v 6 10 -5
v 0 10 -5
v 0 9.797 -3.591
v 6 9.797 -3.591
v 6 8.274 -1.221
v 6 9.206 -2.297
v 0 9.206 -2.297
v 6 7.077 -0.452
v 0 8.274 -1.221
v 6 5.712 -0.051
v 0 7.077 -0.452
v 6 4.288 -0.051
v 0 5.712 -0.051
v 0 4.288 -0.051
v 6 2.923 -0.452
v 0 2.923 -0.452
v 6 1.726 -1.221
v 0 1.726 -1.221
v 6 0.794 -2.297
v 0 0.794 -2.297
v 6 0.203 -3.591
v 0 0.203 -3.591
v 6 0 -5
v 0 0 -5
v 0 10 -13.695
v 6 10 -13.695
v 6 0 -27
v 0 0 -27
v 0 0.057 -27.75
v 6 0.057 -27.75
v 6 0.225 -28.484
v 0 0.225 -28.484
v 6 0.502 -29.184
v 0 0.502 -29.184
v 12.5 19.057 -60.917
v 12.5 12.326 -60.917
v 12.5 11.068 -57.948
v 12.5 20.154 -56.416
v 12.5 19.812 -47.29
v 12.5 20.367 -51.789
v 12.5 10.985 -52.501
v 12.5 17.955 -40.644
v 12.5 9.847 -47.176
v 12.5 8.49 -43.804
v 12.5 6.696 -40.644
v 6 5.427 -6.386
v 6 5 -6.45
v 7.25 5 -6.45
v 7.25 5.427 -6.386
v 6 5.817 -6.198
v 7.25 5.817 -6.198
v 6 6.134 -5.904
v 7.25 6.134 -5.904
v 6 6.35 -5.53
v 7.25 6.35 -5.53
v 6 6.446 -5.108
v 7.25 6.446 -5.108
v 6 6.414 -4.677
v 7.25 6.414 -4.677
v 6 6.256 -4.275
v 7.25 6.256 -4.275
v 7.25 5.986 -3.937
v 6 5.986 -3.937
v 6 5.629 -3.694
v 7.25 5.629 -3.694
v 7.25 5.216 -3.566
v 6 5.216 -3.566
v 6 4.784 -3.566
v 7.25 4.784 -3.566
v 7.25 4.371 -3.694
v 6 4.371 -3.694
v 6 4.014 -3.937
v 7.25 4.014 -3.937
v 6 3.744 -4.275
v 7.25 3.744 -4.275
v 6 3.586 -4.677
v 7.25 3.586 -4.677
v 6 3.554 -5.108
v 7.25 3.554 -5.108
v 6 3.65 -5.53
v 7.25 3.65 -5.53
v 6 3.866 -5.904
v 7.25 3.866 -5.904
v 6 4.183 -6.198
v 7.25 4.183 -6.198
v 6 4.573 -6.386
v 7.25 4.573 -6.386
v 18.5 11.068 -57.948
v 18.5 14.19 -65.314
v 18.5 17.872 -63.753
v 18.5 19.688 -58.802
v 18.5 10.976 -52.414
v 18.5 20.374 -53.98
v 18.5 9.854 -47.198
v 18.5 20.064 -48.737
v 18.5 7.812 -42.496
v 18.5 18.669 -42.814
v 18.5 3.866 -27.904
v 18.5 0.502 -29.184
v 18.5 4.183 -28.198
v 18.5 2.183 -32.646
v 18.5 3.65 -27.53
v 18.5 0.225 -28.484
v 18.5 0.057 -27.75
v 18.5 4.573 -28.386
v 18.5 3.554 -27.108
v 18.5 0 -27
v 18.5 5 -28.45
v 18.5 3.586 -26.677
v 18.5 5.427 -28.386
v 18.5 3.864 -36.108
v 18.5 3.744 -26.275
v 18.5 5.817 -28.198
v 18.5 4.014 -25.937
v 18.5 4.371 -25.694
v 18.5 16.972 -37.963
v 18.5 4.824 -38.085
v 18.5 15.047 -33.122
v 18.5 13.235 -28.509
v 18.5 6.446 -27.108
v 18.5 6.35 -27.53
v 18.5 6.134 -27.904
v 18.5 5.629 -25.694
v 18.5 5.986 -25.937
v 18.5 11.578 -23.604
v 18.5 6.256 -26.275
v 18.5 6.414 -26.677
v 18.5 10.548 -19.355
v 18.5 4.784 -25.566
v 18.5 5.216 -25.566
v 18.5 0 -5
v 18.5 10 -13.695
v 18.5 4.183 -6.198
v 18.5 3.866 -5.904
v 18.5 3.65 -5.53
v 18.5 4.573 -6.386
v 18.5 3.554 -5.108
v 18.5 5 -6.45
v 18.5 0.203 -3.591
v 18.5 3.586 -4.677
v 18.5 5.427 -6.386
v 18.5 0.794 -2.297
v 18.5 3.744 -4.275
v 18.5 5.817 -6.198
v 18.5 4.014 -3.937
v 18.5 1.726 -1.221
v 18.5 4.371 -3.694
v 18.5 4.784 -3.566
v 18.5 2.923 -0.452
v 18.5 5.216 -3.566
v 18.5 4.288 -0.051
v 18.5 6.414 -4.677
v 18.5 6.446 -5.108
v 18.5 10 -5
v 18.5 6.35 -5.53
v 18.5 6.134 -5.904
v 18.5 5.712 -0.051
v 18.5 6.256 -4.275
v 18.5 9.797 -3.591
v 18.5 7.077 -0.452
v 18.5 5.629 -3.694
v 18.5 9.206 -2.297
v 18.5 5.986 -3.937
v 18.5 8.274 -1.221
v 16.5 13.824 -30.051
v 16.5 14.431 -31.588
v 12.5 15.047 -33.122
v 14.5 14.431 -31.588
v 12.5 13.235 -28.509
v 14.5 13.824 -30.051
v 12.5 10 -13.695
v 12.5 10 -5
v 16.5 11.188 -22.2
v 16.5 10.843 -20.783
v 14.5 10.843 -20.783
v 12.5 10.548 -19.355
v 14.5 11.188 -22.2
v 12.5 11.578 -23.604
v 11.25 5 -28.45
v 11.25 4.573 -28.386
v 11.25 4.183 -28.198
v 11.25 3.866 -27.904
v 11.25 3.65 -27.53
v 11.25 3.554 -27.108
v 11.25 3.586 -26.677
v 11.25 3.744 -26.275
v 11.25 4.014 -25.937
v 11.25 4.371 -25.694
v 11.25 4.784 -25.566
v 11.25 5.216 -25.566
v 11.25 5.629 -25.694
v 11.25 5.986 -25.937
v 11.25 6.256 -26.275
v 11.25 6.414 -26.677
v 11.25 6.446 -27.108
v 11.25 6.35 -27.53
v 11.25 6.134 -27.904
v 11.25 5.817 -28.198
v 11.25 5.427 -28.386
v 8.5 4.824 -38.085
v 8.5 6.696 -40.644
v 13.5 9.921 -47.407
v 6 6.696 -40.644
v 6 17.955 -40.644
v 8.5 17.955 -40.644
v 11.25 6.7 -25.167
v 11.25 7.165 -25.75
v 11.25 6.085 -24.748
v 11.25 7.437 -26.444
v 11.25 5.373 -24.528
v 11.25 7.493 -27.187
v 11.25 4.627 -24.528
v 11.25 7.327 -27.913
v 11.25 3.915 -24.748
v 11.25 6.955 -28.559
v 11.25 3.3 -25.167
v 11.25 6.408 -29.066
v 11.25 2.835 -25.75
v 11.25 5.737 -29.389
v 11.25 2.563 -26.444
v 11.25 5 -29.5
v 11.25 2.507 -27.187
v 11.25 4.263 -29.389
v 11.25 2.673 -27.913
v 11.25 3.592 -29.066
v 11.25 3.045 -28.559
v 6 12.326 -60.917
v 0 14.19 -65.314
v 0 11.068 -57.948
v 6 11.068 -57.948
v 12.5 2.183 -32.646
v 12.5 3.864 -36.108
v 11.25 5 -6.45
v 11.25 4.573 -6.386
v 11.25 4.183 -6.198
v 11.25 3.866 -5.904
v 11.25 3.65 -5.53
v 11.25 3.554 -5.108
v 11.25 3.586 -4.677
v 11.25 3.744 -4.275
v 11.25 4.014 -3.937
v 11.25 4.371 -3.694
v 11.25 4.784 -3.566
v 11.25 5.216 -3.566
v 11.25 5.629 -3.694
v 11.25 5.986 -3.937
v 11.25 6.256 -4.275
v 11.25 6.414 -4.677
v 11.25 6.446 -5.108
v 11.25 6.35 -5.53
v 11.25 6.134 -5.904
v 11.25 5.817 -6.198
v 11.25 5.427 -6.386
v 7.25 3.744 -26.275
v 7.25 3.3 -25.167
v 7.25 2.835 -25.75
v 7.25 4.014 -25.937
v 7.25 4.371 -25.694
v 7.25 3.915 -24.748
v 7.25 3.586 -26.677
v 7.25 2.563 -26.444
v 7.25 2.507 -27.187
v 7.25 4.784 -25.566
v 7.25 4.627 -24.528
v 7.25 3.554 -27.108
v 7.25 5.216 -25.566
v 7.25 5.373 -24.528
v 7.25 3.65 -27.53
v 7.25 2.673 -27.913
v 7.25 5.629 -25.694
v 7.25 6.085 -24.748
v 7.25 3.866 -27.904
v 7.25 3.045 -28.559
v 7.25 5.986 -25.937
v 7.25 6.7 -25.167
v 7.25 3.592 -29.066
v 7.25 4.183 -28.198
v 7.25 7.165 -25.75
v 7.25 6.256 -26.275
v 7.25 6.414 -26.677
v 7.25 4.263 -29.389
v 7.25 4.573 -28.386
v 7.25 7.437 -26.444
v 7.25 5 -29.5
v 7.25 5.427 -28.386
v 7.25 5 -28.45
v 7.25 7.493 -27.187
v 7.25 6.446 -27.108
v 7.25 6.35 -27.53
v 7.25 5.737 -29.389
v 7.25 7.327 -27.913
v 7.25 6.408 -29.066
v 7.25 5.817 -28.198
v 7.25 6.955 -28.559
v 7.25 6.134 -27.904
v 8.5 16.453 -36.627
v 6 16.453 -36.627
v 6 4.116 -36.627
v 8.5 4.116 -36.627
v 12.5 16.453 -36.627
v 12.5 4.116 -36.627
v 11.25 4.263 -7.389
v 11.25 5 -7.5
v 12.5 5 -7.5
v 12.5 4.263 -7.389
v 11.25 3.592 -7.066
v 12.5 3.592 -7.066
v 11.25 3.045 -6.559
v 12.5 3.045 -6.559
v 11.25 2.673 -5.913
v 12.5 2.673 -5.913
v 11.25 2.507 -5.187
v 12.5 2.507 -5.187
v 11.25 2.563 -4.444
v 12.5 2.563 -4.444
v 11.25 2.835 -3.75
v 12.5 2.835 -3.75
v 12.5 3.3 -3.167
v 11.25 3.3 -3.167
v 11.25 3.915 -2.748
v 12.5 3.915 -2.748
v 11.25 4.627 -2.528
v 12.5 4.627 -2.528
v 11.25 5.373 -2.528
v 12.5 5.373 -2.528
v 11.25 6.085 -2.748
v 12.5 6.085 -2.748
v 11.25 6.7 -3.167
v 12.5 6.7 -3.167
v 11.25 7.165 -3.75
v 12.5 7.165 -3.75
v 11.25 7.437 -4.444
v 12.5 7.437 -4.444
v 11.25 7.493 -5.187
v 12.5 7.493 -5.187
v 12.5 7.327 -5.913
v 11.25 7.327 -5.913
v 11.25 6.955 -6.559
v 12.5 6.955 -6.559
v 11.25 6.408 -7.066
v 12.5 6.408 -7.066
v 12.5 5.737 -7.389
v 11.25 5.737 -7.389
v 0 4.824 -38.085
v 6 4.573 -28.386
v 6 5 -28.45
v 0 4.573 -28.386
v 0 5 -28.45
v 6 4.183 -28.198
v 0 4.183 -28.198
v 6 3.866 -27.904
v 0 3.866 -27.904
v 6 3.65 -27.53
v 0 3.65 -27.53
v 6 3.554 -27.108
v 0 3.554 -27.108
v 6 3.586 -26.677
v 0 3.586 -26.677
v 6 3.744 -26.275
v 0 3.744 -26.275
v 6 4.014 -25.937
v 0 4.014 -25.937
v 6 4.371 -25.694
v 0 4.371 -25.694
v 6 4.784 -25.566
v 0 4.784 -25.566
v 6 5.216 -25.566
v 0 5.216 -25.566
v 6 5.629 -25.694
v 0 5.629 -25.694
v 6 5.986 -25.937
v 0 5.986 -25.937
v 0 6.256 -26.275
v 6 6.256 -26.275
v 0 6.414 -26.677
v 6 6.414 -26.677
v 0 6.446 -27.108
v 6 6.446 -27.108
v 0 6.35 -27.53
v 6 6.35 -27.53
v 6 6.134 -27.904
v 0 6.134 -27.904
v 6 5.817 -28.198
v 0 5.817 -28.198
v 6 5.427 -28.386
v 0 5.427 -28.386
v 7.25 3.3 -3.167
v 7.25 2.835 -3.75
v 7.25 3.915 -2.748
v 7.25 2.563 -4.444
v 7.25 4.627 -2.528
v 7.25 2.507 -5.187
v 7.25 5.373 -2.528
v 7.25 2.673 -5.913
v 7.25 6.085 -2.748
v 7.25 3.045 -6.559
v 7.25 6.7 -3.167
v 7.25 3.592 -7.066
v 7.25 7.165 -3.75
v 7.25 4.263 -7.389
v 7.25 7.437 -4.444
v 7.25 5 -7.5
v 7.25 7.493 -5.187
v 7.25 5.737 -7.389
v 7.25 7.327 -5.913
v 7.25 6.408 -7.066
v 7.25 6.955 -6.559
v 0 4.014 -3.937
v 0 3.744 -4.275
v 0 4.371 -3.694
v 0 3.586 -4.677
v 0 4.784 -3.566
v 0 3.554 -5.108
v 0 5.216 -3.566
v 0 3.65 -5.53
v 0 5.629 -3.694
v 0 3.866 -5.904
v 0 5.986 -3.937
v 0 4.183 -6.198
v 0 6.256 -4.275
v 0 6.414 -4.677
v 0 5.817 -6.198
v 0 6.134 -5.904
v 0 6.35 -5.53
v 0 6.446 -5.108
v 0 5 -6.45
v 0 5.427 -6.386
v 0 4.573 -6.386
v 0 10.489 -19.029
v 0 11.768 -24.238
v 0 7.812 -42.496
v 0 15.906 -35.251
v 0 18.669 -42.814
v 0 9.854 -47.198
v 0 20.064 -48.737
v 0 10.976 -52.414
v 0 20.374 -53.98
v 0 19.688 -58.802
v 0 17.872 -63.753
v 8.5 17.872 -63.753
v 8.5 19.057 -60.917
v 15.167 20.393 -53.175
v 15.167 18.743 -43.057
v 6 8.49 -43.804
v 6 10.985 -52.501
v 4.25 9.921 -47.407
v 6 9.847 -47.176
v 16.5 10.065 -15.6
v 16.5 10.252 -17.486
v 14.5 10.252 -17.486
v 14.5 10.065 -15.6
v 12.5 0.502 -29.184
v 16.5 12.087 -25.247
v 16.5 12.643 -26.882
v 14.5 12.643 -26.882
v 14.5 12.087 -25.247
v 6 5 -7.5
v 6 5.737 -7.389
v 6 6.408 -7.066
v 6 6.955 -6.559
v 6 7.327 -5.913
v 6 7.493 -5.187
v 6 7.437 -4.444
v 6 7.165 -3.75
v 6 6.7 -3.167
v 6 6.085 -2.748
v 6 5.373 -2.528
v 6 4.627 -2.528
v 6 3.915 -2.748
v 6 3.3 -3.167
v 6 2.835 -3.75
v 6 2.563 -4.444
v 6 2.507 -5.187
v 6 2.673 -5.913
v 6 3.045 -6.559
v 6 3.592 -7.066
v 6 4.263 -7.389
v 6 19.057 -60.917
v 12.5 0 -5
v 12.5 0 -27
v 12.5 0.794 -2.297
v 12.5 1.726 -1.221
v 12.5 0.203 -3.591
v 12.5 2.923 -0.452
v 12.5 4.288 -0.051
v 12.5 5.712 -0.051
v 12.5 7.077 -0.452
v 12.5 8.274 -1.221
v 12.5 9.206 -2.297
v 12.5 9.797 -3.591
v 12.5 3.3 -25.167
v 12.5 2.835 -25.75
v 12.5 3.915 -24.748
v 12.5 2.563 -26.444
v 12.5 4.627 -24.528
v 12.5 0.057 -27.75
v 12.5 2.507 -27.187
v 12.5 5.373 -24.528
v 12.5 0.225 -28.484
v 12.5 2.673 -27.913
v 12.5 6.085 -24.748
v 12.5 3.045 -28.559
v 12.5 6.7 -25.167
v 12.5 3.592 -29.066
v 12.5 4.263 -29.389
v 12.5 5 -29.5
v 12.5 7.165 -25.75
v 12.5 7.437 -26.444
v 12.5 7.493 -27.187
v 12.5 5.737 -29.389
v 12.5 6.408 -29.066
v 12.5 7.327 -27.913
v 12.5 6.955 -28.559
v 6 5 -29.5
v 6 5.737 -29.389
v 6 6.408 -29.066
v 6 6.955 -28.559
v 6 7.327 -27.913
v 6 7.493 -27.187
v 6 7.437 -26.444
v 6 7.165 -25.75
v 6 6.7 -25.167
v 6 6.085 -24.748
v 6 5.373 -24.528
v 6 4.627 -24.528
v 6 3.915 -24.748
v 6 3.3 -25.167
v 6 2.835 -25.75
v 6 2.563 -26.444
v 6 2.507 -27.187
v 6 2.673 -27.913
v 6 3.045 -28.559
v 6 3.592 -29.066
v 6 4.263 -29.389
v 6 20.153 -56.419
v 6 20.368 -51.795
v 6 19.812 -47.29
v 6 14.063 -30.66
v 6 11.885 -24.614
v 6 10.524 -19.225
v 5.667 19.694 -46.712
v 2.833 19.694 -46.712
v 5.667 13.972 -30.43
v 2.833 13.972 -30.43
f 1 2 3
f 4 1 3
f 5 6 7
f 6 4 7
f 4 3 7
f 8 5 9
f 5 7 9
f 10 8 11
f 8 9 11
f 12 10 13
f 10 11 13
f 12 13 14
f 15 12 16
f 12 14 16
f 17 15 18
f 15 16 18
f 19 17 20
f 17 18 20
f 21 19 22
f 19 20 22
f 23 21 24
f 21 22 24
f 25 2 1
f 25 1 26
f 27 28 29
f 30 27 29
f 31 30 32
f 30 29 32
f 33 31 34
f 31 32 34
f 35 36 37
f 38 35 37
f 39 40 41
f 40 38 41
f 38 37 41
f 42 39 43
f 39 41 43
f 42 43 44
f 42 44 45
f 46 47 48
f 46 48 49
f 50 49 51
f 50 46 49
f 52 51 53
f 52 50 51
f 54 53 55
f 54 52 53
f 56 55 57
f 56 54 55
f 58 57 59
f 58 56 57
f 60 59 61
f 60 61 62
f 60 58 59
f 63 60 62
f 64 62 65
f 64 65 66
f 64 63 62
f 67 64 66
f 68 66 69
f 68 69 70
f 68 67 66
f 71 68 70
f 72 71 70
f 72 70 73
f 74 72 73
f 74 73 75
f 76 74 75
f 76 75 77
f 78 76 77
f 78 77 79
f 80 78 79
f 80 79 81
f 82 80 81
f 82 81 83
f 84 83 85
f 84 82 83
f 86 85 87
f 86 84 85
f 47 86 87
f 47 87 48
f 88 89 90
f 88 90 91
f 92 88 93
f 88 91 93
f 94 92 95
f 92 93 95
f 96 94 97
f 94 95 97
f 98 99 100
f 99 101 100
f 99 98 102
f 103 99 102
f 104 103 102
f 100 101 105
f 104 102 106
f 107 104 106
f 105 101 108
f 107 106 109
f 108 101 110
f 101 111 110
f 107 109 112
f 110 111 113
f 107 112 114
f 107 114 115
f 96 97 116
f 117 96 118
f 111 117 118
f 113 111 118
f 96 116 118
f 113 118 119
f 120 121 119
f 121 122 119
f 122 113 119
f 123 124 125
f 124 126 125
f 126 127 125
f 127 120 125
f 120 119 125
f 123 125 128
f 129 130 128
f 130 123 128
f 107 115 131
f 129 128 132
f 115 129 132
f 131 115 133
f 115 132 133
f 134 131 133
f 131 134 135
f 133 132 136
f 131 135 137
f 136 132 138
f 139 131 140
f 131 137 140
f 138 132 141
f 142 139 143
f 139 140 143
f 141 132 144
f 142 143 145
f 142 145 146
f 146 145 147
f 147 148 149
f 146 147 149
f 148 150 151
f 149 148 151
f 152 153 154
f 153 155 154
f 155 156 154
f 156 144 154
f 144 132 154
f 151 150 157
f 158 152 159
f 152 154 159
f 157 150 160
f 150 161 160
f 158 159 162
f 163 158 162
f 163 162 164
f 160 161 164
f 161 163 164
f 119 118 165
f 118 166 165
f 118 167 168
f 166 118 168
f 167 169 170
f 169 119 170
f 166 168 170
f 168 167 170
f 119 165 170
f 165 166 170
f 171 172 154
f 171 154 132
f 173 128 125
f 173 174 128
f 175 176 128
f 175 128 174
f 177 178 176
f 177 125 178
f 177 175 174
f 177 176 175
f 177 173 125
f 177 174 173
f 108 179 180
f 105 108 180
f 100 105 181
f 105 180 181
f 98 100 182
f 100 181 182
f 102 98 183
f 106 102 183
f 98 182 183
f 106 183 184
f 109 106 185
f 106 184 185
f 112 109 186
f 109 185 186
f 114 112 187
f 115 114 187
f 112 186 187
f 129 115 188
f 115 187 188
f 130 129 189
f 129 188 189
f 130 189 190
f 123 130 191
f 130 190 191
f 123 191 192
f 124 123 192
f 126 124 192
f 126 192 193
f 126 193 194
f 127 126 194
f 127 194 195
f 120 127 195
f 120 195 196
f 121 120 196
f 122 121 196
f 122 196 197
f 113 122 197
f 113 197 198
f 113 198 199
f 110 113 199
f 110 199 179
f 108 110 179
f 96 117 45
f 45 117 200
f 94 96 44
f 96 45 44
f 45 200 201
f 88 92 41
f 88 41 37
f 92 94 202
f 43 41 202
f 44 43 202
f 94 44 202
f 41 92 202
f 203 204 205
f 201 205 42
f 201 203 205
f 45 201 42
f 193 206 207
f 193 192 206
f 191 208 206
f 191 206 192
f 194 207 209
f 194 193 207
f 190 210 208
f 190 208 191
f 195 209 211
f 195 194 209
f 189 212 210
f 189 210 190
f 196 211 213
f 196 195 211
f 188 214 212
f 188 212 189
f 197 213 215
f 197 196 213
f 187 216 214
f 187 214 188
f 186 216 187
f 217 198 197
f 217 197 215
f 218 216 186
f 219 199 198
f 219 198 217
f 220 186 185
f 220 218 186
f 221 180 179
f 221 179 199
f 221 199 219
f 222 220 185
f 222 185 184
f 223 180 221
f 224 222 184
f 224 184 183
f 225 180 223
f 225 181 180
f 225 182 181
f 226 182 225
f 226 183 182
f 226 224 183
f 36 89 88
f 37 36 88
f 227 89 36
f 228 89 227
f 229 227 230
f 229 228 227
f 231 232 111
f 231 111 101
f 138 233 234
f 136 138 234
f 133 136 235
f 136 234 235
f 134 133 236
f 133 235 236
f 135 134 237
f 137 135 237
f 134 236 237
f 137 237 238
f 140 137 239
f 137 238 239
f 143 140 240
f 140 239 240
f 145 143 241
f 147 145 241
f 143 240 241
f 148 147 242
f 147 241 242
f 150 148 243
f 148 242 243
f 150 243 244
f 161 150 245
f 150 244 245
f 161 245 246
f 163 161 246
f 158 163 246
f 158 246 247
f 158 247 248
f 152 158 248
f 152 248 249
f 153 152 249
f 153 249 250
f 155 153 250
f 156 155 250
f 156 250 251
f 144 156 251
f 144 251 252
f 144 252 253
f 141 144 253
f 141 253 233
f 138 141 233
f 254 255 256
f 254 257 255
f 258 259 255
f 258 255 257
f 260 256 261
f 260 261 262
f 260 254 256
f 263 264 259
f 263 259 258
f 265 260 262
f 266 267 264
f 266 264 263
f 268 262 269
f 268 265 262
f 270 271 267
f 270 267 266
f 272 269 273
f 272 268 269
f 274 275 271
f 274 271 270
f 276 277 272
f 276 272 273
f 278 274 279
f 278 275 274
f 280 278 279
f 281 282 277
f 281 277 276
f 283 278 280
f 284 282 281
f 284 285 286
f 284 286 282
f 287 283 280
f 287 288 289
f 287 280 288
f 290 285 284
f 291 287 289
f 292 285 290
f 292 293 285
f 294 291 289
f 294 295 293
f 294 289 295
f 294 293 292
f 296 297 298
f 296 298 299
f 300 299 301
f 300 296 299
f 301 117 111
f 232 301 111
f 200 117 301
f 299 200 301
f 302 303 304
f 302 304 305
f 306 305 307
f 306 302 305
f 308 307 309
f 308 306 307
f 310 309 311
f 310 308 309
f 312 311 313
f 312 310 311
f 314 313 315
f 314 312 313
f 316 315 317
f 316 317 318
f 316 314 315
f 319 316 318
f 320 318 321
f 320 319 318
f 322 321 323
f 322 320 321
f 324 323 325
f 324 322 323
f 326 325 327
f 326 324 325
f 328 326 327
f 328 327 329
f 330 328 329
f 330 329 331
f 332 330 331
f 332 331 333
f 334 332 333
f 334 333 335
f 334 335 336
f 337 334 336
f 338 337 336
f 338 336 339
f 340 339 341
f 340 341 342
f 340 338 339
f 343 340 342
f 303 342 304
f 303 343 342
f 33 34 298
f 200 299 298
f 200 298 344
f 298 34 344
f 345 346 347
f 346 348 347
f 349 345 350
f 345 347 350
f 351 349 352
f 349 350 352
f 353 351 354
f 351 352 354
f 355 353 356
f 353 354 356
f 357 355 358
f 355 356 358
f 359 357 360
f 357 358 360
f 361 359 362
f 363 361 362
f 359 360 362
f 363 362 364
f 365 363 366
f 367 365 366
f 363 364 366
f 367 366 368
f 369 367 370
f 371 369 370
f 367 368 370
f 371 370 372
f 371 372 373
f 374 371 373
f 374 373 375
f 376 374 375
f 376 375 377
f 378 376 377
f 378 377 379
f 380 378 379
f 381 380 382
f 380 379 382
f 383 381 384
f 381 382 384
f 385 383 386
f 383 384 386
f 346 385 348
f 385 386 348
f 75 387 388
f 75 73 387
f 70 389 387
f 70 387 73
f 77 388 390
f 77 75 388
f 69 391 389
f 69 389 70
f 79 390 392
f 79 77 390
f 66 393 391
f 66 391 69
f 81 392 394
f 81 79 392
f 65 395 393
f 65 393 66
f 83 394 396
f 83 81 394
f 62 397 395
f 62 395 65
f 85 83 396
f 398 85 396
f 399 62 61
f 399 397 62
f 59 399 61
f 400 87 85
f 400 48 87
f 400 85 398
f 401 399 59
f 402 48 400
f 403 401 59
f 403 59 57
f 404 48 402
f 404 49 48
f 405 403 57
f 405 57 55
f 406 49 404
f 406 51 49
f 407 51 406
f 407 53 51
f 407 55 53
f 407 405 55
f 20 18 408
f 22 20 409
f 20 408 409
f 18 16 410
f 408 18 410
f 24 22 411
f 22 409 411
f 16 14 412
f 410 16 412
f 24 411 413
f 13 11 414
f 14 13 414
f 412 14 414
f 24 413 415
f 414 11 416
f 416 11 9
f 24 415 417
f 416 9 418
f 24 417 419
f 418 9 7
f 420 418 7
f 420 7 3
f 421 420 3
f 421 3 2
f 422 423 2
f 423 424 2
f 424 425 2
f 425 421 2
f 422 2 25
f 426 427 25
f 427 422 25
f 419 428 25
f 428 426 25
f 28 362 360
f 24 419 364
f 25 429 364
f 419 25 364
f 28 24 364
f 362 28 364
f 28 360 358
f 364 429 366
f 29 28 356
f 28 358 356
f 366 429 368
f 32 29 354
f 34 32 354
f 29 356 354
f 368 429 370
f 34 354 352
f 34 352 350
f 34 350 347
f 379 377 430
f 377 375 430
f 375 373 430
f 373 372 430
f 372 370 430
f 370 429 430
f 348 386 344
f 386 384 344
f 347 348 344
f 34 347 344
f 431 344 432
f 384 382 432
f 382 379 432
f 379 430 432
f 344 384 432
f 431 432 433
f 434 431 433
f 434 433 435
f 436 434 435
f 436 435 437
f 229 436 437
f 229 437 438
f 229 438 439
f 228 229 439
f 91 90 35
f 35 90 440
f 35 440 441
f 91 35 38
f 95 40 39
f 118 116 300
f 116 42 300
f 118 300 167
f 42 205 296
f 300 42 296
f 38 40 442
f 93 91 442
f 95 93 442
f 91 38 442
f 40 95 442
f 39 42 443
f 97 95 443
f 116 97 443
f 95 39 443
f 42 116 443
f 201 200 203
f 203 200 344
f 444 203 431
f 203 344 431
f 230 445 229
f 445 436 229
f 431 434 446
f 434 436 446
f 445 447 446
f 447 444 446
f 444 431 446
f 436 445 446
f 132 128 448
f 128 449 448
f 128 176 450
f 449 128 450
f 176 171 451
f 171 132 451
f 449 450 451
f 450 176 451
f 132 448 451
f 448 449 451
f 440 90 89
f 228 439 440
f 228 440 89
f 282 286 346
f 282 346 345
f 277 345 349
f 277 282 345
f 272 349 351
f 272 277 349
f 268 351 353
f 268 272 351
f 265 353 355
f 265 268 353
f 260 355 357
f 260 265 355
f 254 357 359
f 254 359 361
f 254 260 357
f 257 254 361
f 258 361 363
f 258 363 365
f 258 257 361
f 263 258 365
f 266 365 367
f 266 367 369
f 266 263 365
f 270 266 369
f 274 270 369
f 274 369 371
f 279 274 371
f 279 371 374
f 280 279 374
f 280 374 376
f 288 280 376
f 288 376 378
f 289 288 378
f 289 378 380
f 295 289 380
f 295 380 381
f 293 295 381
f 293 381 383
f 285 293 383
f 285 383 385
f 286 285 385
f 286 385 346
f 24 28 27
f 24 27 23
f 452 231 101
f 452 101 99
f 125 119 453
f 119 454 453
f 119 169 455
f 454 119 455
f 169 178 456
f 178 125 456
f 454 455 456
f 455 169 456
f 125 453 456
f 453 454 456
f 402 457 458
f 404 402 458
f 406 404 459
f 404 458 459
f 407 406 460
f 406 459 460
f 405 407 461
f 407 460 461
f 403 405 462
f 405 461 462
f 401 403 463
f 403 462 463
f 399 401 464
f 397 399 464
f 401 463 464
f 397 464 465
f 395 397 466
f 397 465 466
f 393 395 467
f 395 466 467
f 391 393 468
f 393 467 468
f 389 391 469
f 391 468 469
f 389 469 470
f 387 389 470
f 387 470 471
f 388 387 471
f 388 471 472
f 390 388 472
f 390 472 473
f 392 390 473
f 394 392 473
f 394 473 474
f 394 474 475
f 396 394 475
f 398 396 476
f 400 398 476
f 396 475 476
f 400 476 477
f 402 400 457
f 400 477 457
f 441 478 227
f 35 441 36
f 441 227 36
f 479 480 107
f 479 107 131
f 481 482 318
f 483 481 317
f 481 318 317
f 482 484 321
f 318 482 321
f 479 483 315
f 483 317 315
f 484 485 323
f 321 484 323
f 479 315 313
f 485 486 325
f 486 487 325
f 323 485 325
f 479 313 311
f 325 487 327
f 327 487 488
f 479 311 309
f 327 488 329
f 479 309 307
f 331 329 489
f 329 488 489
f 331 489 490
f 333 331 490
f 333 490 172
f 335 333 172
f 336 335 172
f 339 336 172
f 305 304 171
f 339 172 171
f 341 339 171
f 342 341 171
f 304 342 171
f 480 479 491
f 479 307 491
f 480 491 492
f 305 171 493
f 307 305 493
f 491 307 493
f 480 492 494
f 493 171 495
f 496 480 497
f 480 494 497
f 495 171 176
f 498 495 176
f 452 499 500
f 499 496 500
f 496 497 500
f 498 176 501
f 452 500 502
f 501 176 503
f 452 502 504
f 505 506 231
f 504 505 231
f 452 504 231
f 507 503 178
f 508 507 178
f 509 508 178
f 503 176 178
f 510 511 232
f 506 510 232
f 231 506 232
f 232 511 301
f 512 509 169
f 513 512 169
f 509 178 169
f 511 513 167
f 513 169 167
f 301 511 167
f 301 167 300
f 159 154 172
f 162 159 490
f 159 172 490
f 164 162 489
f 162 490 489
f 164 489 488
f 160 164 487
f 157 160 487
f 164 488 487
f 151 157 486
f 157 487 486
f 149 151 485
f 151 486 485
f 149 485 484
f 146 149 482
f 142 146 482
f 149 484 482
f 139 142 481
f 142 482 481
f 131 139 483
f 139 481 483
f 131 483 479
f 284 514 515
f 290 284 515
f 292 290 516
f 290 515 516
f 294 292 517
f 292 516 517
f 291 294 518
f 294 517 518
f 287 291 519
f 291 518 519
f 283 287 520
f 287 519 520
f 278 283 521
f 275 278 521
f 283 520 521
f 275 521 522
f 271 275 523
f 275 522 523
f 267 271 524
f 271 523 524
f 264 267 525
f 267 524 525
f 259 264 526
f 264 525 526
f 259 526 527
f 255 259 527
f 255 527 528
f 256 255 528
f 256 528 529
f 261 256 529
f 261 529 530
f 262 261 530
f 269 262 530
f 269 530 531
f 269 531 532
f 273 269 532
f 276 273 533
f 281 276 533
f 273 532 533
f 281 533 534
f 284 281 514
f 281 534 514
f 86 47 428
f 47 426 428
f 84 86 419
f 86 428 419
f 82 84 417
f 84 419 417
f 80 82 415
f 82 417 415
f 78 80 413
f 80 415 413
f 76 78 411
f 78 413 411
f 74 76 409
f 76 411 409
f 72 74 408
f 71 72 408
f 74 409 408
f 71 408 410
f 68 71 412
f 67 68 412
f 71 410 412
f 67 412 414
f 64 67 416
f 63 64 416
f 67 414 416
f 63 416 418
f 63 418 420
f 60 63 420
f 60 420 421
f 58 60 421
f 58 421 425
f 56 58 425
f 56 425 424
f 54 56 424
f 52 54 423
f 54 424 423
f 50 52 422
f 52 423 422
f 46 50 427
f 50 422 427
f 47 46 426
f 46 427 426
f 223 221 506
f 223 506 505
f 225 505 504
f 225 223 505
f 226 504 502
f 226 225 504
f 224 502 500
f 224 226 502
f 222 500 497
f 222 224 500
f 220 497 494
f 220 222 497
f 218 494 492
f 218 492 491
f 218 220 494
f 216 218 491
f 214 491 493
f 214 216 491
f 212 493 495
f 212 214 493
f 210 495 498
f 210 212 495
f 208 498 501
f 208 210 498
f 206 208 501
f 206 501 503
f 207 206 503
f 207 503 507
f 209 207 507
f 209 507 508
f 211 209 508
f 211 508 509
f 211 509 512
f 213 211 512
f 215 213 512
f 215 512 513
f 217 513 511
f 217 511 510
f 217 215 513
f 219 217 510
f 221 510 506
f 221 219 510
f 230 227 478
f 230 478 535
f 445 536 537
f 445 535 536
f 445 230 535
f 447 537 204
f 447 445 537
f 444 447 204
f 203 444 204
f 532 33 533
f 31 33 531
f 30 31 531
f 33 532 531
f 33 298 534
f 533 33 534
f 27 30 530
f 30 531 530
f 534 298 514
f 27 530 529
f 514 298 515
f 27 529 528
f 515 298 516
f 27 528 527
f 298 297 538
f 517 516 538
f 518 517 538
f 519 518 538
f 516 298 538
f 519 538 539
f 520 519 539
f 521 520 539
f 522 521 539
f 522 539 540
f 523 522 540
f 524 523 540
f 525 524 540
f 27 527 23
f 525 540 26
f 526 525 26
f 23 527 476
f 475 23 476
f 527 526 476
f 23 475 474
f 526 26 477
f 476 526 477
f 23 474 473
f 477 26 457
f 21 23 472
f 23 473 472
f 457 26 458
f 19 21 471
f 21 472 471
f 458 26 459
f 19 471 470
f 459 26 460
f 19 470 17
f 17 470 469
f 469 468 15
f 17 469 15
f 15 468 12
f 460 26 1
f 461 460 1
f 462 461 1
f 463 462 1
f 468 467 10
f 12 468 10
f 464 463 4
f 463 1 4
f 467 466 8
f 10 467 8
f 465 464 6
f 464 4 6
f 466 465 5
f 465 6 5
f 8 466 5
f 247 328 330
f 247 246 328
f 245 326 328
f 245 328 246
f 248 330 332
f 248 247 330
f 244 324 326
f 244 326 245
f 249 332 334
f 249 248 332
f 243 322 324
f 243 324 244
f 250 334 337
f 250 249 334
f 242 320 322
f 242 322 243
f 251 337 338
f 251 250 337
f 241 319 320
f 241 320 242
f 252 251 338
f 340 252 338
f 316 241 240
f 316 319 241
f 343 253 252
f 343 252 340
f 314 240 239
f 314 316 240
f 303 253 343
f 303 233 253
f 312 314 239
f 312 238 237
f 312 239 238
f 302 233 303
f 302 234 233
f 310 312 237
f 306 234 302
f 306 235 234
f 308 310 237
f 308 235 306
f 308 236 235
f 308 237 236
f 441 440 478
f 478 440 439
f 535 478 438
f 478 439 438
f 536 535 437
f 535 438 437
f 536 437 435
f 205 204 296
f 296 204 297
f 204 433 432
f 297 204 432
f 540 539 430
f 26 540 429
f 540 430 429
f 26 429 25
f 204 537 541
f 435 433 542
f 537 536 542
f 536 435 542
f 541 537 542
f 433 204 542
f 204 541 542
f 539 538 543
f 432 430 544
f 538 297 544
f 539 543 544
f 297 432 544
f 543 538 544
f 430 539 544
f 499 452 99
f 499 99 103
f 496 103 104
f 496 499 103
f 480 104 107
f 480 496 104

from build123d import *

# Parameters (mm, degrees)
SKETCH1_R            = 1.45
BOSS_EXTRUDE1_DEPTH  = 8.5
BOSS_EXTRUDE2_START  = -8.5
BOSS_EXTRUDE2_DEPTH  = 8.5
BOSS_EXTRUDE3_DEPTH  = 10
SKETCH4_R            = 5
BOSS_EXTRUDE4_DEPTH  = 10
BOSS_EXTRUDE5_DEPTH  = 10
BOSS_EXTRUDE6_DEPTH  = 10
BOSS_EXTRUDE7_DEPTH  = 10
BOSS_EXTRUDE8_DEPTH  = 10
BOSS_EXTRUDE9_DEPTH  = 10
SKETCH10_R           = 1.45
CUT_EXTRUDE2_DEPTH   = 28
SKETCH11_W           = 6.5
SKETCH11_H           = 22.932404029
SKETCH11_H_2         = 5
SKETCH11_H_3         = 8.694974759
CUT_EXTRUDE3_DEPTH   = 49
SKETCH12_W           = 6.5
SKETCH12_H           = 22.932404029
CUT_EXTRUDE4_DEPTH   = 49
SKETCH14_W           = 6.5
SKETCH14_H           = 20.273775142
CUT_EXTRUDE5_DEPTH   = 49
BOSS_EXTRUDE10_START = 1.25
SKETCH17_R           = 2.5
SKETCH17_R_2         = 1.45
BOSS_EXTRUDE10_DEPTH = 1.25
SKETCH18_R           = 2.5
SKETCH18_R_2         = 1.45
BOSS_EXTRUDE11_DEPTH = 1.25
SKETCH19_R           = 2.5
BOSS_EXTRUDE12_DEPTH = 1.25
BOSS_EXTRUDE13_START = 1.25
SKETCH21_R           = 2.5
SKETCH21_R_2         = 1.45
BOSS_EXTRUDE13_DEPTH = 1.25
SKETCH22_R           = 1.45
CUT_EXTRUDE6_DEPTH   = 70.556228756


with BuildPart() as part:
    # Sketch1 → Boss-Extrude1 (new body)
    with BuildSketch(Plane(origin=(0, 0, 0), x_dir=(0, 0, -1), z_dir=(1, 0, 0))):
        with BuildLine():
            Line((27, 10), (5, 10))
            ThreePointArc((5, 10), (0, 5), (5, 0))
            Line((5, 0), (27, 0))
            ThreePointArc((27, 0), (32, 5), (27, 10))
        make_face()
        with Locations((5, 5)):
            Circle(SKETCH1_R, mode=Mode.SUBTRACT)
        with Locations((27, 5)):
            Circle(SKETCH1_R, mode=Mode.SUBTRACT)
    extrude(amount=BOSS_EXTRUDE1_DEPTH)

    # Sketch2 → Boss-Extrude2 (add)
    with BuildSketch(Plane(origin=(8.5, 0, 0), x_dir=(0, 0, -1), z_dir=(1, 0, 0)).offset(BOSS_EXTRUDE2_START)):
        with BuildLine():
            add(Edge.make_bspline(
                [(63.752972286, 17.872423117), (45.928882678, 26.563787963), (31.059268621, 10), (13.694974759, 10)],
                knots=[0, 0, 0, 0, 1, 1, 1, 1], degree=3))
            Line((13.694974759, 10), (27, 10))
            ThreePointArc((27, 10), (31.87285141, 6.120410255), (29.183837075, 0.502127655))
            Line((29.183837075, 0.502127655), (38.08542066, 4.824084077))
            add(Edge.make_bspline(
                [(38.08542066, 4.824084077), (46.797509509, 11.895222457), (57.948000409, 11.067843667)],
                knots=[0, 0, 0, 1, 1, 1], degree=2))
            Line((57.948000409, 11.067843667), (65.313809691, 14.189518476))
            Line((65.313809691, 14.189518476), (63.752972286, 17.872423117))
        make_face()
    extrude(amount=BOSS_EXTRUDE2_DEPTH)

    # Sketch3 → Boss-Extrude3 (add)
    with BuildSketch(Plane(origin=(8.5, 0, 0), x_dir=(0, 0, -1), z_dir=(1, 0, 0))):
        with BuildLine():
            Line((36.108074214, 3.8640296), (33.121739514, 15.047376099))
            add(Edge.make_bspline(
                [(63.752972286, 17.872423117), (52.853080786, 23.187417369), (43.058056373, 19.057897142), (33.121739514, 15.047376099)],
                knots=[0, 0, 0, 0, 0.611525847, 0.611525847, 0.611525847, 0.611525847], degree=3))
            Line((63.752972286, 17.872423117), (65.313809691, 14.189518476))
            Line((65.313809691, 14.189518476), (57.948000409, 11.067843667))
            add(Edge.make_bspline(
                [(38.08542066, 4.824084077), (46.79750951, 11.895222457), (57.948000409, 11.067843667)],
                knots=[0, 0, 0, 1, 1, 1], degree=2))
            Line((38.08542066, 4.824084077), (36.108074214, 3.8640296))
        make_face()
    extrude(amount=BOSS_EXTRUDE3_DEPTH)

    # Sketch4 → Boss-Extrude4 (add)
    with BuildSketch(Plane(origin=(8.5, 0, 0), x_dir=(0, 0, -1), z_dir=(1, 0, 0))):
        with Locations(Location((5, 5, 0), (0, 0, 270))):
            Circle(SKETCH4_R)
    extrude(amount=BOSS_EXTRUDE4_DEPTH)

    # Sketch5 → Boss-Extrude5 (add)
    with BuildSketch(Plane(origin=(8.5, 0, 0), x_dir=(0, 0, -1), z_dir=(1, 0, 0))):
        with BuildLine():
            Line((5, 10), (13.694974759, 10))
            Line((13.694974759, 10), (13.694974759, 0))
            Line((13.694974759, 0), (5, 0))
            ThreePointArc((5, 0), (10, 5), (5, 10))
        make_face()
    extrude(amount=BOSS_EXTRUDE5_DEPTH)

    # Sketch6 → Boss-Extrude6 (add)
    with BuildSketch(Plane(origin=(8.5, 0, 0), x_dir=(0, 0, -1), z_dir=(1, 0, 0))):
        with BuildLine():
            Line((19.355254229, 10.548091727), (21.320062705, 0))
            Line((21.320062705, 0), (13.694974759, 0))
            Line((13.694974759, 0), (13.694974759, 10))
            add(Edge.make_bspline(
                [(19.355254229, 10.548091727), (17.493954956, 10.201384788), (15.609630186, 10), (13.694974759, 10)],
                knots=[0.889736062, 0.889736062, 0.889736062, 0.889736062, 1, 1, 1, 1], degree=3))
        make_face()
    extrude(amount=BOSS_EXTRUDE6_DEPTH)

    # Sketch7 → Boss-Extrude7 (add)
    with BuildSketch(Plane(origin=(8.5, 0, 0), x_dir=(0, 0, -1), z_dir=(1, 0, 0))):
        with BuildLine():
            Line((32.645955645, 2.183078628), (28.509427835, 13.235241807))
            add(Edge.make_bspline(
                [(33.121739514, 15.047376099), (31.589187648, 14.428803684), (30.053274551, 13.813062163), (28.509427835, 13.235241807)],
                knots=[0.611525847, 0.611525847, 0.611525847, 0.611525847, 0.705846016, 0.705846016, 0.705846016, 0.705846016], degree=3))
            Line((33.121739514, 15.047376099), (36.108074214, 3.8640296))
            Line((36.108074214, 3.8640296), (32.645955645, 2.183078628))
        make_face()
    extrude(amount=BOSS_EXTRUDE7_DEPTH)

    # Sketch8 → Boss-Extrude8 (add)
    with BuildSketch(Plane(origin=(8.5, 0, 0), x_dir=(0, 0, -1), z_dir=(1, 0, 0))):
        with BuildLine():
            Line((27, 0), (23.604335966, 11.578089924))
            add(Edge.make_bspline(
                [(28.509427835, 13.235241807), (26.884956708, 12.627245898), (25.251701682, 12.061235292), (23.604335966, 11.578089924)],
                knots=[0.705846016, 0.705846016, 0.705846016, 0.705846016, 0.805091873, 0.805091873, 0.805091873, 0.805091873], degree=3))
            Line((28.509427835, 13.235241807), (32.645955645, 2.183078628))
            Line((32.645955645, 2.183078628), (29.183837075, 0.502127655))
            ThreePointArc((29.183837075, 0.502127655), (28.120410255, 0.12714859), (27, 0))
        make_face()
    extrude(amount=BOSS_EXTRUDE8_DEPTH)

    # Sketch9 → Boss-Extrude9 (add)
    with BuildSketch(Plane(origin=(8.5, 0, 0), x_dir=(0, 0, -1), z_dir=(1, 0, 0))):
        with BuildLine():
            Line((23.604335966, 11.578089924), (27, 0))
            Line((27, 0), (21.320062705, 0))
            Line((21.320062705, 0), (19.355254229, 10.548091727))
            add(Edge.make_bspline(
                [(19.355254229, 10.548091727), (20.788925962, 10.815127802), (22.205425846, 11.167809658), (23.604335966, 11.578089924)],
                knots=[0, 0, 0, 0, 1, 1, 1, 1], degree=3))
        make_face()
    extrude(amount=BOSS_EXTRUDE9_DEPTH)

    # Sketch10 → Cut-Extrude2 (cut)
    with BuildSketch(Plane.ZY):
        with Locations(Location((-27, 5, 0), (0, 0, 180))):
            Circle(SKETCH10_R)
        with Locations(Location((-5, 5, 0), (0, 0, 180))):
            Circle(SKETCH10_R)
    extrude(amount=-CUT_EXTRUDE2_DEPTH, mode=Mode.SUBTRACT)

    # Sketch11 → Cut-Extrude3 (cut)
    with BuildSketch(Plane(origin=(0, 10, 0), x_dir=(1, 0, 0), z_dir=(0, 1, 0))):
        with Locations((9.25, 25.161176774)):
            Rectangle(SKETCH11_W, SKETCH11_H)
        with Locations((9.25, 2.5)):
            Rectangle(SKETCH11_W, SKETCH11_H_2)
        with Locations((9.25, 9.34748738)):
            Rectangle(SKETCH11_W, SKETCH11_H_3)
    extrude(amount=-CUT_EXTRUDE3_DEPTH, mode=Mode.SUBTRACT)

    # Sketch12 → Cut-Extrude4 (cut)
    with BuildSketch(Plane(origin=(0, 10, 0), x_dir=(-1, 0, 0), z_dir=(0, -1, 0))):
        with Locations((-9.25, 25.161176774)):
            Rectangle(SKETCH12_W, SKETCH12_H)
    extrude(amount=-CUT_EXTRUDE4_DEPTH, mode=Mode.SUBTRACT)

    # Sketch14 → Cut-Extrude5 (cut)
    with BuildSketch(Plane.XZ):
        with Locations((9.25, -50.780431109)):
            Rectangle(SKETCH14_W, SKETCH14_H)
    extrude(amount=-CUT_EXTRUDE5_DEPTH, mode=Mode.SUBTRACT)

    # Sketch17 → Boss-Extrude10 (add)
    with BuildSketch(Plane.ZY.offset(-12.5).offset(BOSS_EXTRUDE10_START)):
        with Locations(Location((-5, 5, 0), (0, 0, 180))):
            Circle(SKETCH17_R)
        with Locations(Location((-5, 5, 0), (0, 0, 180))):
            Circle(SKETCH17_R_2, mode=Mode.SUBTRACT)
    extrude(amount=-BOSS_EXTRUDE10_DEPTH)

    # Sketch18 → Boss-Extrude11 (add)
    with BuildSketch(Plane(origin=(6, 0, 0), x_dir=(0, 0, -1), z_dir=(1, 0, 0))):
        with Locations((5, 5)):
            Circle(SKETCH18_R)
        with Locations((5, 5)):
            Circle(SKETCH18_R_2, mode=Mode.SUBTRACT)
    extrude(amount=BOSS_EXTRUDE11_DEPTH)

    # Sketch19 → Boss-Extrude12 (add)
    with BuildSketch(Plane(origin=(6, 0, 0), x_dir=(0, 0, -1), z_dir=(1, 0, 0))):
        with Locations((27, 5)):
            Circle(SKETCH19_R)
    extrude(amount=BOSS_EXTRUDE12_DEPTH)

    # Sketch21 → Boss-Extrude13 (add)
    with BuildSketch(Plane.ZY.offset(-12.5).offset(BOSS_EXTRUDE13_START)):
        with Locations(Location((-27, 5, 0), (0, 0, 180))):
            Circle(SKETCH21_R)
        with Locations(Location((-27, 5, 0), (0, 0, 180))):
            Circle(SKETCH21_R_2, mode=Mode.SUBTRACT)
    extrude(amount=-BOSS_EXTRUDE13_DEPTH)

    # Sketch22 → Cut-Extrude6 (cut, through all)
    with BuildSketch(Plane.ZY.offset(-12.5)):
        with Locations(Location((-27, 5, 0), (0, 0, 180))):
            Circle(SKETCH22_R)
    extrude(amount=CUT_EXTRUDE6_DEPTH, mode=Mode.SUBTRACT)


solid = part.part
